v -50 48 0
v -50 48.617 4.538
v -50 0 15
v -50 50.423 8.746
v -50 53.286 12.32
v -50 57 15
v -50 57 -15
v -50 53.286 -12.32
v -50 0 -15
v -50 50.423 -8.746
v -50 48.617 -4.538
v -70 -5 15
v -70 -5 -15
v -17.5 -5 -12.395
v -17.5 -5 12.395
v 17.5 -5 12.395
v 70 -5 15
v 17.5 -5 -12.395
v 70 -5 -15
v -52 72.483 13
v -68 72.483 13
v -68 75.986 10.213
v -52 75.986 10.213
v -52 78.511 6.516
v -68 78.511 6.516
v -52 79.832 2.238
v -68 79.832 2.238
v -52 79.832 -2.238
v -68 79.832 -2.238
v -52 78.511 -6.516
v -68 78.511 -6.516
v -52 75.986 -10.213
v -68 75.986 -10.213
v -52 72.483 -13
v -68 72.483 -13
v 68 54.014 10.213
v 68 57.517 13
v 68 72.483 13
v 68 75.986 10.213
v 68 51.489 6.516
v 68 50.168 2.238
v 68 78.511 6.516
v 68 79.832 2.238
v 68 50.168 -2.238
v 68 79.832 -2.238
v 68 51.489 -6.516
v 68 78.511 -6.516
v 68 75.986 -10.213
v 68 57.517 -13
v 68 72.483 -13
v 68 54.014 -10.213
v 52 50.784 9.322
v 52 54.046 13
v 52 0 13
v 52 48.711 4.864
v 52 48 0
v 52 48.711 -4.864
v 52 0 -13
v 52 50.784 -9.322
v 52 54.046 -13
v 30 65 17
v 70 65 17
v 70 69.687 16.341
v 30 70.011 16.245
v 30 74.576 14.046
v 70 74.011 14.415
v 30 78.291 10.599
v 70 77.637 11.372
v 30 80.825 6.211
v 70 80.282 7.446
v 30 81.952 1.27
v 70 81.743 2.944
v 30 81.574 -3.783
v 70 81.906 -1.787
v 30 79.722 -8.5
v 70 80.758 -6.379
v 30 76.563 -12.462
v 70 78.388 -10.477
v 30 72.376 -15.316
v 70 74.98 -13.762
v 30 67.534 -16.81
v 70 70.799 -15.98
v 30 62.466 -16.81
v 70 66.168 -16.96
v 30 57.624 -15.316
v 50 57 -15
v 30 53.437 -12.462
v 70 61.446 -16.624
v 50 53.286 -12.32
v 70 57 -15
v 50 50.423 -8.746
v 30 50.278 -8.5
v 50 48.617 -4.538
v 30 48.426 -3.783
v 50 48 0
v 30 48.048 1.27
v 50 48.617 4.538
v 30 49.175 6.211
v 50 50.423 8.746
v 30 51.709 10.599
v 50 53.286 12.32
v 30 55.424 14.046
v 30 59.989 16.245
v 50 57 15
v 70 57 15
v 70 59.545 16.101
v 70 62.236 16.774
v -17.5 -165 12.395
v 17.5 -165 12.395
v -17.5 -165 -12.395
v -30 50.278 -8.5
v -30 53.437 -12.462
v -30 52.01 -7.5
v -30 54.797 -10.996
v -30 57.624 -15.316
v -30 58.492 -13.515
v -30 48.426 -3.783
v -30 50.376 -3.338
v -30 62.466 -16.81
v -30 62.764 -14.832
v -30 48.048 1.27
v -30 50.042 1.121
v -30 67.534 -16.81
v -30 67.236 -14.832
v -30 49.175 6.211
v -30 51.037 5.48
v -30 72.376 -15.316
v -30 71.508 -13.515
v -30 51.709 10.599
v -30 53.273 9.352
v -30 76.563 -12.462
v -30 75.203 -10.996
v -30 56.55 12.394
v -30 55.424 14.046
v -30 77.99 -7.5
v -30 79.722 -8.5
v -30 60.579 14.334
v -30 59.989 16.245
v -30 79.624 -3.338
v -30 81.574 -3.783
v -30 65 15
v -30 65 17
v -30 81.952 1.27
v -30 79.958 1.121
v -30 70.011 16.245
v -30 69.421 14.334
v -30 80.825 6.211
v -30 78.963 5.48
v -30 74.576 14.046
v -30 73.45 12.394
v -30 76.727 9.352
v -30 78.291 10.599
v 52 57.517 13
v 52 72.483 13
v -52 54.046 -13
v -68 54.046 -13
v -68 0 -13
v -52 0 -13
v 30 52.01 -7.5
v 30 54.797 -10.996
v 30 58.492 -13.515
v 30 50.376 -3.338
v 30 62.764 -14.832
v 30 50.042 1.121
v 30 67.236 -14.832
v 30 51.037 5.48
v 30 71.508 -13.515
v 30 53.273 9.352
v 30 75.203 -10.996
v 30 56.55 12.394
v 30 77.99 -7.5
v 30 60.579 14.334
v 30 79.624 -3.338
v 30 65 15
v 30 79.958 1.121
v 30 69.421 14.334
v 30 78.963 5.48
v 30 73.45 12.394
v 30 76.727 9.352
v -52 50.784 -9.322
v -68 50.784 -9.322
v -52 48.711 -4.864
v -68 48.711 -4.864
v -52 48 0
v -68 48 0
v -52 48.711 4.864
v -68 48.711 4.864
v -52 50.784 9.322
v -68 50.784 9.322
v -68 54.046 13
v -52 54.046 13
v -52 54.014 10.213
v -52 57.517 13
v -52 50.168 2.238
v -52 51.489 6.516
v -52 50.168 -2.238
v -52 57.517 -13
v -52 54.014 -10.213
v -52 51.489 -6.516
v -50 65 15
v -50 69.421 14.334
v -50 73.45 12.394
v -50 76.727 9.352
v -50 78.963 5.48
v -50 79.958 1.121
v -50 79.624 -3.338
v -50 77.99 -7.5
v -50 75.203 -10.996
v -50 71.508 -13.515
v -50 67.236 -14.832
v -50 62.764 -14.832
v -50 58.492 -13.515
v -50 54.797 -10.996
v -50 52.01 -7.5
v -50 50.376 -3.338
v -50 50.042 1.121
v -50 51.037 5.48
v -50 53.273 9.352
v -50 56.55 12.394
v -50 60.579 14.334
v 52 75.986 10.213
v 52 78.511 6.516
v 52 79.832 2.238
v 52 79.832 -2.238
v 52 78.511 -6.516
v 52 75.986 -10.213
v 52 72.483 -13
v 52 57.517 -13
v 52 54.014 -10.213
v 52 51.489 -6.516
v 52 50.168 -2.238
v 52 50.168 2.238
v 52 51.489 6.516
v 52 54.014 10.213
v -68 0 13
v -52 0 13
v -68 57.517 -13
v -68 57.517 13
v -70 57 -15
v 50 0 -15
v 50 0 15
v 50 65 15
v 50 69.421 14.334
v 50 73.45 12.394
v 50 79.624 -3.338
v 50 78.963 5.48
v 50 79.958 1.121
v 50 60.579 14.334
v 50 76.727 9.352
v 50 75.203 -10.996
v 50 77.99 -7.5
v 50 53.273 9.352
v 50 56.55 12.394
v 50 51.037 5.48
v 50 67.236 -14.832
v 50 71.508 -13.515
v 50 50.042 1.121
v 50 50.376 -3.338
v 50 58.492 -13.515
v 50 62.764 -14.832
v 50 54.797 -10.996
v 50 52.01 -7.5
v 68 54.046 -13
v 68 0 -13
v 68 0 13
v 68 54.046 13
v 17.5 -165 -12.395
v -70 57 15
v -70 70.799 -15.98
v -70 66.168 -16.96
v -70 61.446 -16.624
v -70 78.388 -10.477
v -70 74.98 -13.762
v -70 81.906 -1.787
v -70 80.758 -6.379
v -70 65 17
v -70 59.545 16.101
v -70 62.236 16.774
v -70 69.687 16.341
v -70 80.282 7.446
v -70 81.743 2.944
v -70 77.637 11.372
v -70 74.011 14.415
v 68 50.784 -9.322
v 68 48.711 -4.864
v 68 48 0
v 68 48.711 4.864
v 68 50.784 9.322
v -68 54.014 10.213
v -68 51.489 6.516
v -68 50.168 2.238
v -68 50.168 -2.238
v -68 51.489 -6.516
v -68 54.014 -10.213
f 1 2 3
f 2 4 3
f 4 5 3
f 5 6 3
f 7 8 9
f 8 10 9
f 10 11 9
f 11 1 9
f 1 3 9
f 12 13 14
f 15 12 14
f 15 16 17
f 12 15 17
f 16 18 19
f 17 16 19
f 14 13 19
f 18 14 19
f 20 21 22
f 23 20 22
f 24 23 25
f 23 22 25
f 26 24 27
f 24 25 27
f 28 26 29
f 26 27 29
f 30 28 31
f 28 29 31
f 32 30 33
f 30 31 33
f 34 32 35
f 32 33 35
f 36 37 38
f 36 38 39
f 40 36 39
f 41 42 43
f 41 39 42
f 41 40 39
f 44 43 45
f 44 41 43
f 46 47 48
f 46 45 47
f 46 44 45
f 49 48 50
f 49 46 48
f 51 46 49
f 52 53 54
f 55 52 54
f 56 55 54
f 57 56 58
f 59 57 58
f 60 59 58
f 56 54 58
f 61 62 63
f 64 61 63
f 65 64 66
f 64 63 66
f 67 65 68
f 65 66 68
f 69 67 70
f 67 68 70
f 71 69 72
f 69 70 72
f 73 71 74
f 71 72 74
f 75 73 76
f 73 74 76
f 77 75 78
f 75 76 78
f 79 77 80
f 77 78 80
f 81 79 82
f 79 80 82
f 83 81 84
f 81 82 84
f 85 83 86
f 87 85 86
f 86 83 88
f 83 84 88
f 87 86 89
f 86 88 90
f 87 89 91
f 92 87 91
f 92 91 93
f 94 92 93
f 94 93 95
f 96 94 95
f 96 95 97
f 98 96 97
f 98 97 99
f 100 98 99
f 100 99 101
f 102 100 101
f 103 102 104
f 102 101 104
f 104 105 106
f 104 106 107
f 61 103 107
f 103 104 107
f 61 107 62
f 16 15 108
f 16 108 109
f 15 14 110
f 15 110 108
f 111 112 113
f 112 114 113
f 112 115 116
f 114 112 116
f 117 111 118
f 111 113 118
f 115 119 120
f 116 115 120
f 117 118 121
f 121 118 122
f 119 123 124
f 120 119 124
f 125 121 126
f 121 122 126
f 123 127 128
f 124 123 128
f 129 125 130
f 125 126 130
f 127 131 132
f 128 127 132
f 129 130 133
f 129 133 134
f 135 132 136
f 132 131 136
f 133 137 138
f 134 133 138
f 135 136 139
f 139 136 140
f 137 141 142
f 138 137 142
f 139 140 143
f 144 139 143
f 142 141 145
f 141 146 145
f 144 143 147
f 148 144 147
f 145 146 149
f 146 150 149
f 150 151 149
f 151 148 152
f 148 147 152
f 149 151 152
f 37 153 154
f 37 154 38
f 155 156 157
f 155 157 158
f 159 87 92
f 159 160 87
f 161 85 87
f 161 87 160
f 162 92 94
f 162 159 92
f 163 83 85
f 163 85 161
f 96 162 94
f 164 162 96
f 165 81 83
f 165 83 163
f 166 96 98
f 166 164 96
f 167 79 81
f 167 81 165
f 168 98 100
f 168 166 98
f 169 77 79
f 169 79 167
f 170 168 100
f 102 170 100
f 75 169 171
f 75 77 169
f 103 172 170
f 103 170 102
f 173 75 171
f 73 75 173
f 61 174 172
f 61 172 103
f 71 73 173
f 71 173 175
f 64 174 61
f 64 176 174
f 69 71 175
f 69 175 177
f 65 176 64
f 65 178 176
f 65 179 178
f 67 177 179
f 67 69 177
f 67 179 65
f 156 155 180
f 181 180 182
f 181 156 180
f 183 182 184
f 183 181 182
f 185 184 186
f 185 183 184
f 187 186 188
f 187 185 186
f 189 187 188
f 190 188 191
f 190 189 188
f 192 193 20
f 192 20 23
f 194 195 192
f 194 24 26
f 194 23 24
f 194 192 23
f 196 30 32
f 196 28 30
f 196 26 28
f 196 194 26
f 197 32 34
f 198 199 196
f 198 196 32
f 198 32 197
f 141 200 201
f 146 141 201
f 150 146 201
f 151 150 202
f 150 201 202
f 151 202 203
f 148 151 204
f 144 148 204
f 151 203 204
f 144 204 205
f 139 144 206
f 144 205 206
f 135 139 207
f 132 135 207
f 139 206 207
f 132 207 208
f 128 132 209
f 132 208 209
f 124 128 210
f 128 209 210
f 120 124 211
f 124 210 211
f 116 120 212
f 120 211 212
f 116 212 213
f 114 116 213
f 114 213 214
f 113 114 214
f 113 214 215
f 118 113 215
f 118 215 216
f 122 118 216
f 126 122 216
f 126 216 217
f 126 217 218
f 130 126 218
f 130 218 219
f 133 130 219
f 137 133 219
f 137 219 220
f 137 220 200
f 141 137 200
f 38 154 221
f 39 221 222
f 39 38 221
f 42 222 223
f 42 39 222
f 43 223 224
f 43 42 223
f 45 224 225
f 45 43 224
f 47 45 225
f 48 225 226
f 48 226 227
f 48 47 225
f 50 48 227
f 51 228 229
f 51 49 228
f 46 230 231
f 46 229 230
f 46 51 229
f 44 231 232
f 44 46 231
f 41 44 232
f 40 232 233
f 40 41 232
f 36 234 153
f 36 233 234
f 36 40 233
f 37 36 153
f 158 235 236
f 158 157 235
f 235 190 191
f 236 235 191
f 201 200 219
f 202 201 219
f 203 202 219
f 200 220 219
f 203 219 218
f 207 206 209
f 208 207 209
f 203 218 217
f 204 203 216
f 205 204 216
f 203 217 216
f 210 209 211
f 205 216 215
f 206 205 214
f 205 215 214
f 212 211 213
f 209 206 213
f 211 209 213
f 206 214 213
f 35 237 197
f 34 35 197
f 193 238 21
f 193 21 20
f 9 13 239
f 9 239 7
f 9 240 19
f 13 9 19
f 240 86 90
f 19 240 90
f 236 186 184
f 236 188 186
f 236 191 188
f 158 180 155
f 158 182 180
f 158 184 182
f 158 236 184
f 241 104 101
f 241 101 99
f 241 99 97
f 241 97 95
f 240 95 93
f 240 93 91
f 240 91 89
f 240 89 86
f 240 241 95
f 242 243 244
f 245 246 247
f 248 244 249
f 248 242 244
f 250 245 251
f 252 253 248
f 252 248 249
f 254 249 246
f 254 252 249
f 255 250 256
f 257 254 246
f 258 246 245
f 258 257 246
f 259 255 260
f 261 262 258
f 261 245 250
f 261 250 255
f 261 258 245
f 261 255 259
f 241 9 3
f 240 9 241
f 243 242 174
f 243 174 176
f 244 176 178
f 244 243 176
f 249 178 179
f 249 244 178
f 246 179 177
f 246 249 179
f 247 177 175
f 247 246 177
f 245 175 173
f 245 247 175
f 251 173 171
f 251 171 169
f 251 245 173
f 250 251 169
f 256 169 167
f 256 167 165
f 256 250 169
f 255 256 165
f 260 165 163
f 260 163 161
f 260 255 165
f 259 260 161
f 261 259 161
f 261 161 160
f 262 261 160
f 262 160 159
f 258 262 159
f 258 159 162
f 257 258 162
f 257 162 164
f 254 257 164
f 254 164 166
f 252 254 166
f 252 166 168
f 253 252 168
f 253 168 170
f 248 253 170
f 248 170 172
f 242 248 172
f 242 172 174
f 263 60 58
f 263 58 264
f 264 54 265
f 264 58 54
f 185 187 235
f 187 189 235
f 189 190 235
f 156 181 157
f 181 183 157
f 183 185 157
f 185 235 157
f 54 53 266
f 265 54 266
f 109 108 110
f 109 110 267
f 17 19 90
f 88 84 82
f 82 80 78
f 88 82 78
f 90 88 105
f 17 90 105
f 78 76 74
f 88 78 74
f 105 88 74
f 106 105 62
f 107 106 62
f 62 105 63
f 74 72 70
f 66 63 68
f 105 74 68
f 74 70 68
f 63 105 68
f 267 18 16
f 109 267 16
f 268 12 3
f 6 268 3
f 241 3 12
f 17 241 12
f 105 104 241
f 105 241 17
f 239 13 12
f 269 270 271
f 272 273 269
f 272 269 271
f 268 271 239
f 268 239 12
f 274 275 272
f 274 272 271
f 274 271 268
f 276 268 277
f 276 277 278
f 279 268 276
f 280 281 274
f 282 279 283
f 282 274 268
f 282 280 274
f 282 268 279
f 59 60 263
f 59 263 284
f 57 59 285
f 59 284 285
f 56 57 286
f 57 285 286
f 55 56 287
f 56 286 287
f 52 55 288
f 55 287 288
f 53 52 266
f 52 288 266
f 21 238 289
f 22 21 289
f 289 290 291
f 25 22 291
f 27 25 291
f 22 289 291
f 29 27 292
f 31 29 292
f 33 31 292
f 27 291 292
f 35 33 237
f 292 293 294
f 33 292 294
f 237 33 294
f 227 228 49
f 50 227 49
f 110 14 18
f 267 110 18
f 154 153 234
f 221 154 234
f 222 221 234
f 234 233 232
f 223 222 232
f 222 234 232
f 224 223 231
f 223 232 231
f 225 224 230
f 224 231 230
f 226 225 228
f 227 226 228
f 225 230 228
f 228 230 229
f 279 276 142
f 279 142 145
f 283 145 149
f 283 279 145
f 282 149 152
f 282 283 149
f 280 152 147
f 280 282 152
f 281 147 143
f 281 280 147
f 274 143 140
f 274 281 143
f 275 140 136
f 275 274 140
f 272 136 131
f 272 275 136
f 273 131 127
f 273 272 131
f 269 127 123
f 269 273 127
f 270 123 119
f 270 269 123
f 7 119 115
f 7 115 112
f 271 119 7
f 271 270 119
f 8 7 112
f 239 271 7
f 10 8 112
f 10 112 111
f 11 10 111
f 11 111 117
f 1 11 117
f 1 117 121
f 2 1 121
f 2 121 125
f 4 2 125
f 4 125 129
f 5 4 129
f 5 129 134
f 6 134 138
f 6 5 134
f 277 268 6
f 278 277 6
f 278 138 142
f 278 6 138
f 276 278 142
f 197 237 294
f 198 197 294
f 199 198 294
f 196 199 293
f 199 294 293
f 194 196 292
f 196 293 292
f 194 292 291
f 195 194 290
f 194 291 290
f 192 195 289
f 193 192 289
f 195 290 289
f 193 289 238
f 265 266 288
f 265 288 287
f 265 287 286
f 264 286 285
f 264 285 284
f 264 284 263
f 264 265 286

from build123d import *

# Parameters (mm, degrees)
SKETCH1_W                 = 140
SKETCH1_H                 = 30
BOSS_EXTRUDE1_DEPTH       = 5
EXTRUDE_THIN1_START       = -5
EXTRUDE_THIN1_OUTLINE_W   = 20
EXTRUDE_THIN1_OUTLINE_H   = 30
EXTRUDE_THIN1_OUTLINE_W_2 = 16
EXTRUDE_THIN1_OUTLINE_H_2 = 26
EXTRUDE_THIN1_DEPTH       = 85
FILLET1_SIZE              = 15
SKETCH3_R                 = 17
SKETCH3_R_2               = 15
EXTRUDE_THIN2_DEPTH       = 40
SKETCH4_W                 = 35
SKETCH4_H                 = 24.79
BOSS_EXTRUDE2_DEPTH       = 160


with BuildPart() as part:
    # Sketch1 → Boss-Extrude1 (new body)
    with BuildSketch(Plane(origin=(0, 0, 0), x_dir=(1, 0, 0), z_dir=(0, 1, 0))):
        Rectangle(SKETCH1_W, SKETCH1_H)
    extrude(amount=-BOSS_EXTRUDE1_DEPTH)

    # Extrude-Thin1: read off the stored shape, not the designer's step
    # Extrude-Thin1 outline → Extrude-Thin1 (add)
    # profile 1 of 2: a face of its own
    with BuildSketch(Plane(origin=(0, 0, 0), x_dir=(1, 0, 0), z_dir=(0, 1, 0)).offset(EXTRUDE_THIN1_START)):
        with Locations((60, 0)):
            Rectangle(EXTRUDE_THIN1_OUTLINE_W, EXTRUDE_THIN1_OUTLINE_H)
        with Locations((60, 0)):
            Rectangle(EXTRUDE_THIN1_OUTLINE_W_2, EXTRUDE_THIN1_OUTLINE_H_2, mode=Mode.SUBTRACT)
    # profile 2 of 2: a face of its own
    with BuildSketch(Plane(origin=(0, 0, 0), x_dir=(1, 0, 0), z_dir=(0, 1, 0)).offset(EXTRUDE_THIN1_START)):
        with Locations((-60, 0)):
            Rectangle(EXTRUDE_THIN1_OUTLINE_W, EXTRUDE_THIN1_OUTLINE_H)
        with Locations((-60, 0)):
            Rectangle(EXTRUDE_THIN1_OUTLINE_W_2, EXTRUDE_THIN1_OUTLINE_H_2, mode=Mode.SUBTRACT)
    extrude(amount=EXTRUDE_THIN1_DEPTH)

    # Fillet1
    # a fillet whose section is not a circle: 15 mm, written as the material it takes off along each edge
    with BuildSketch(Plane(origin=(-107.5, 80, 15), x_dir=(0, -1, 0), z_dir=(1, 0, 0)), Plane(origin=(-12.5, 80, -15), x_dir=(0, -1, 0), z_dir=(-1, 0, 0)), Plane(origin=(107.5, 80, -15), x_dir=(0, -1, 0), z_dir=(-1, 0, 0)), Plane(origin=(12.5, 80, 15), x_dir=(0, -1, 0), z_dir=(1, 0, 0))) as fillet1_piece_1:
        with BuildLine():
            Bezier((FILLET1_SIZE, 0), (0, 0), (0, FILLET1_SIZE), weights=[1, 1.060660172, 1])
            Line((0, FILLET1_SIZE), (0, 0))
            Line((0, 0), (FILLET1_SIZE, 0))
        make_face()
    extrude(amount=95, mode=Mode.SUBTRACT)

    # Sketch3 → Extrude-Thin2 (add)
    with BuildSketch(Plane.ZY.offset(70)):
        with Locations((0, 65)):
            Circle(SKETCH3_R)
        with Locations((0, 65)):
            Circle(SKETCH3_R_2, mode=Mode.SUBTRACT)
    extrude_thin2 = extrude(amount=-EXTRUDE_THIN2_DEPTH)

    # Mirror1: Extrude-Thin2 across plane
    add(extrude_thin2.mirror(Plane(origin=(0, 0, 0), x_dir=(0, 0, 1), z_dir=(1, 0, 0))))

    # Sketch4 → Boss-Extrude2 (add)
    with BuildSketch(Plane.XZ.offset(5)):
        Rectangle(SKETCH4_W, SKETCH4_H)
    extrude(amount=BOSS_EXTRUDE2_DEPTH)


solid = part.part
